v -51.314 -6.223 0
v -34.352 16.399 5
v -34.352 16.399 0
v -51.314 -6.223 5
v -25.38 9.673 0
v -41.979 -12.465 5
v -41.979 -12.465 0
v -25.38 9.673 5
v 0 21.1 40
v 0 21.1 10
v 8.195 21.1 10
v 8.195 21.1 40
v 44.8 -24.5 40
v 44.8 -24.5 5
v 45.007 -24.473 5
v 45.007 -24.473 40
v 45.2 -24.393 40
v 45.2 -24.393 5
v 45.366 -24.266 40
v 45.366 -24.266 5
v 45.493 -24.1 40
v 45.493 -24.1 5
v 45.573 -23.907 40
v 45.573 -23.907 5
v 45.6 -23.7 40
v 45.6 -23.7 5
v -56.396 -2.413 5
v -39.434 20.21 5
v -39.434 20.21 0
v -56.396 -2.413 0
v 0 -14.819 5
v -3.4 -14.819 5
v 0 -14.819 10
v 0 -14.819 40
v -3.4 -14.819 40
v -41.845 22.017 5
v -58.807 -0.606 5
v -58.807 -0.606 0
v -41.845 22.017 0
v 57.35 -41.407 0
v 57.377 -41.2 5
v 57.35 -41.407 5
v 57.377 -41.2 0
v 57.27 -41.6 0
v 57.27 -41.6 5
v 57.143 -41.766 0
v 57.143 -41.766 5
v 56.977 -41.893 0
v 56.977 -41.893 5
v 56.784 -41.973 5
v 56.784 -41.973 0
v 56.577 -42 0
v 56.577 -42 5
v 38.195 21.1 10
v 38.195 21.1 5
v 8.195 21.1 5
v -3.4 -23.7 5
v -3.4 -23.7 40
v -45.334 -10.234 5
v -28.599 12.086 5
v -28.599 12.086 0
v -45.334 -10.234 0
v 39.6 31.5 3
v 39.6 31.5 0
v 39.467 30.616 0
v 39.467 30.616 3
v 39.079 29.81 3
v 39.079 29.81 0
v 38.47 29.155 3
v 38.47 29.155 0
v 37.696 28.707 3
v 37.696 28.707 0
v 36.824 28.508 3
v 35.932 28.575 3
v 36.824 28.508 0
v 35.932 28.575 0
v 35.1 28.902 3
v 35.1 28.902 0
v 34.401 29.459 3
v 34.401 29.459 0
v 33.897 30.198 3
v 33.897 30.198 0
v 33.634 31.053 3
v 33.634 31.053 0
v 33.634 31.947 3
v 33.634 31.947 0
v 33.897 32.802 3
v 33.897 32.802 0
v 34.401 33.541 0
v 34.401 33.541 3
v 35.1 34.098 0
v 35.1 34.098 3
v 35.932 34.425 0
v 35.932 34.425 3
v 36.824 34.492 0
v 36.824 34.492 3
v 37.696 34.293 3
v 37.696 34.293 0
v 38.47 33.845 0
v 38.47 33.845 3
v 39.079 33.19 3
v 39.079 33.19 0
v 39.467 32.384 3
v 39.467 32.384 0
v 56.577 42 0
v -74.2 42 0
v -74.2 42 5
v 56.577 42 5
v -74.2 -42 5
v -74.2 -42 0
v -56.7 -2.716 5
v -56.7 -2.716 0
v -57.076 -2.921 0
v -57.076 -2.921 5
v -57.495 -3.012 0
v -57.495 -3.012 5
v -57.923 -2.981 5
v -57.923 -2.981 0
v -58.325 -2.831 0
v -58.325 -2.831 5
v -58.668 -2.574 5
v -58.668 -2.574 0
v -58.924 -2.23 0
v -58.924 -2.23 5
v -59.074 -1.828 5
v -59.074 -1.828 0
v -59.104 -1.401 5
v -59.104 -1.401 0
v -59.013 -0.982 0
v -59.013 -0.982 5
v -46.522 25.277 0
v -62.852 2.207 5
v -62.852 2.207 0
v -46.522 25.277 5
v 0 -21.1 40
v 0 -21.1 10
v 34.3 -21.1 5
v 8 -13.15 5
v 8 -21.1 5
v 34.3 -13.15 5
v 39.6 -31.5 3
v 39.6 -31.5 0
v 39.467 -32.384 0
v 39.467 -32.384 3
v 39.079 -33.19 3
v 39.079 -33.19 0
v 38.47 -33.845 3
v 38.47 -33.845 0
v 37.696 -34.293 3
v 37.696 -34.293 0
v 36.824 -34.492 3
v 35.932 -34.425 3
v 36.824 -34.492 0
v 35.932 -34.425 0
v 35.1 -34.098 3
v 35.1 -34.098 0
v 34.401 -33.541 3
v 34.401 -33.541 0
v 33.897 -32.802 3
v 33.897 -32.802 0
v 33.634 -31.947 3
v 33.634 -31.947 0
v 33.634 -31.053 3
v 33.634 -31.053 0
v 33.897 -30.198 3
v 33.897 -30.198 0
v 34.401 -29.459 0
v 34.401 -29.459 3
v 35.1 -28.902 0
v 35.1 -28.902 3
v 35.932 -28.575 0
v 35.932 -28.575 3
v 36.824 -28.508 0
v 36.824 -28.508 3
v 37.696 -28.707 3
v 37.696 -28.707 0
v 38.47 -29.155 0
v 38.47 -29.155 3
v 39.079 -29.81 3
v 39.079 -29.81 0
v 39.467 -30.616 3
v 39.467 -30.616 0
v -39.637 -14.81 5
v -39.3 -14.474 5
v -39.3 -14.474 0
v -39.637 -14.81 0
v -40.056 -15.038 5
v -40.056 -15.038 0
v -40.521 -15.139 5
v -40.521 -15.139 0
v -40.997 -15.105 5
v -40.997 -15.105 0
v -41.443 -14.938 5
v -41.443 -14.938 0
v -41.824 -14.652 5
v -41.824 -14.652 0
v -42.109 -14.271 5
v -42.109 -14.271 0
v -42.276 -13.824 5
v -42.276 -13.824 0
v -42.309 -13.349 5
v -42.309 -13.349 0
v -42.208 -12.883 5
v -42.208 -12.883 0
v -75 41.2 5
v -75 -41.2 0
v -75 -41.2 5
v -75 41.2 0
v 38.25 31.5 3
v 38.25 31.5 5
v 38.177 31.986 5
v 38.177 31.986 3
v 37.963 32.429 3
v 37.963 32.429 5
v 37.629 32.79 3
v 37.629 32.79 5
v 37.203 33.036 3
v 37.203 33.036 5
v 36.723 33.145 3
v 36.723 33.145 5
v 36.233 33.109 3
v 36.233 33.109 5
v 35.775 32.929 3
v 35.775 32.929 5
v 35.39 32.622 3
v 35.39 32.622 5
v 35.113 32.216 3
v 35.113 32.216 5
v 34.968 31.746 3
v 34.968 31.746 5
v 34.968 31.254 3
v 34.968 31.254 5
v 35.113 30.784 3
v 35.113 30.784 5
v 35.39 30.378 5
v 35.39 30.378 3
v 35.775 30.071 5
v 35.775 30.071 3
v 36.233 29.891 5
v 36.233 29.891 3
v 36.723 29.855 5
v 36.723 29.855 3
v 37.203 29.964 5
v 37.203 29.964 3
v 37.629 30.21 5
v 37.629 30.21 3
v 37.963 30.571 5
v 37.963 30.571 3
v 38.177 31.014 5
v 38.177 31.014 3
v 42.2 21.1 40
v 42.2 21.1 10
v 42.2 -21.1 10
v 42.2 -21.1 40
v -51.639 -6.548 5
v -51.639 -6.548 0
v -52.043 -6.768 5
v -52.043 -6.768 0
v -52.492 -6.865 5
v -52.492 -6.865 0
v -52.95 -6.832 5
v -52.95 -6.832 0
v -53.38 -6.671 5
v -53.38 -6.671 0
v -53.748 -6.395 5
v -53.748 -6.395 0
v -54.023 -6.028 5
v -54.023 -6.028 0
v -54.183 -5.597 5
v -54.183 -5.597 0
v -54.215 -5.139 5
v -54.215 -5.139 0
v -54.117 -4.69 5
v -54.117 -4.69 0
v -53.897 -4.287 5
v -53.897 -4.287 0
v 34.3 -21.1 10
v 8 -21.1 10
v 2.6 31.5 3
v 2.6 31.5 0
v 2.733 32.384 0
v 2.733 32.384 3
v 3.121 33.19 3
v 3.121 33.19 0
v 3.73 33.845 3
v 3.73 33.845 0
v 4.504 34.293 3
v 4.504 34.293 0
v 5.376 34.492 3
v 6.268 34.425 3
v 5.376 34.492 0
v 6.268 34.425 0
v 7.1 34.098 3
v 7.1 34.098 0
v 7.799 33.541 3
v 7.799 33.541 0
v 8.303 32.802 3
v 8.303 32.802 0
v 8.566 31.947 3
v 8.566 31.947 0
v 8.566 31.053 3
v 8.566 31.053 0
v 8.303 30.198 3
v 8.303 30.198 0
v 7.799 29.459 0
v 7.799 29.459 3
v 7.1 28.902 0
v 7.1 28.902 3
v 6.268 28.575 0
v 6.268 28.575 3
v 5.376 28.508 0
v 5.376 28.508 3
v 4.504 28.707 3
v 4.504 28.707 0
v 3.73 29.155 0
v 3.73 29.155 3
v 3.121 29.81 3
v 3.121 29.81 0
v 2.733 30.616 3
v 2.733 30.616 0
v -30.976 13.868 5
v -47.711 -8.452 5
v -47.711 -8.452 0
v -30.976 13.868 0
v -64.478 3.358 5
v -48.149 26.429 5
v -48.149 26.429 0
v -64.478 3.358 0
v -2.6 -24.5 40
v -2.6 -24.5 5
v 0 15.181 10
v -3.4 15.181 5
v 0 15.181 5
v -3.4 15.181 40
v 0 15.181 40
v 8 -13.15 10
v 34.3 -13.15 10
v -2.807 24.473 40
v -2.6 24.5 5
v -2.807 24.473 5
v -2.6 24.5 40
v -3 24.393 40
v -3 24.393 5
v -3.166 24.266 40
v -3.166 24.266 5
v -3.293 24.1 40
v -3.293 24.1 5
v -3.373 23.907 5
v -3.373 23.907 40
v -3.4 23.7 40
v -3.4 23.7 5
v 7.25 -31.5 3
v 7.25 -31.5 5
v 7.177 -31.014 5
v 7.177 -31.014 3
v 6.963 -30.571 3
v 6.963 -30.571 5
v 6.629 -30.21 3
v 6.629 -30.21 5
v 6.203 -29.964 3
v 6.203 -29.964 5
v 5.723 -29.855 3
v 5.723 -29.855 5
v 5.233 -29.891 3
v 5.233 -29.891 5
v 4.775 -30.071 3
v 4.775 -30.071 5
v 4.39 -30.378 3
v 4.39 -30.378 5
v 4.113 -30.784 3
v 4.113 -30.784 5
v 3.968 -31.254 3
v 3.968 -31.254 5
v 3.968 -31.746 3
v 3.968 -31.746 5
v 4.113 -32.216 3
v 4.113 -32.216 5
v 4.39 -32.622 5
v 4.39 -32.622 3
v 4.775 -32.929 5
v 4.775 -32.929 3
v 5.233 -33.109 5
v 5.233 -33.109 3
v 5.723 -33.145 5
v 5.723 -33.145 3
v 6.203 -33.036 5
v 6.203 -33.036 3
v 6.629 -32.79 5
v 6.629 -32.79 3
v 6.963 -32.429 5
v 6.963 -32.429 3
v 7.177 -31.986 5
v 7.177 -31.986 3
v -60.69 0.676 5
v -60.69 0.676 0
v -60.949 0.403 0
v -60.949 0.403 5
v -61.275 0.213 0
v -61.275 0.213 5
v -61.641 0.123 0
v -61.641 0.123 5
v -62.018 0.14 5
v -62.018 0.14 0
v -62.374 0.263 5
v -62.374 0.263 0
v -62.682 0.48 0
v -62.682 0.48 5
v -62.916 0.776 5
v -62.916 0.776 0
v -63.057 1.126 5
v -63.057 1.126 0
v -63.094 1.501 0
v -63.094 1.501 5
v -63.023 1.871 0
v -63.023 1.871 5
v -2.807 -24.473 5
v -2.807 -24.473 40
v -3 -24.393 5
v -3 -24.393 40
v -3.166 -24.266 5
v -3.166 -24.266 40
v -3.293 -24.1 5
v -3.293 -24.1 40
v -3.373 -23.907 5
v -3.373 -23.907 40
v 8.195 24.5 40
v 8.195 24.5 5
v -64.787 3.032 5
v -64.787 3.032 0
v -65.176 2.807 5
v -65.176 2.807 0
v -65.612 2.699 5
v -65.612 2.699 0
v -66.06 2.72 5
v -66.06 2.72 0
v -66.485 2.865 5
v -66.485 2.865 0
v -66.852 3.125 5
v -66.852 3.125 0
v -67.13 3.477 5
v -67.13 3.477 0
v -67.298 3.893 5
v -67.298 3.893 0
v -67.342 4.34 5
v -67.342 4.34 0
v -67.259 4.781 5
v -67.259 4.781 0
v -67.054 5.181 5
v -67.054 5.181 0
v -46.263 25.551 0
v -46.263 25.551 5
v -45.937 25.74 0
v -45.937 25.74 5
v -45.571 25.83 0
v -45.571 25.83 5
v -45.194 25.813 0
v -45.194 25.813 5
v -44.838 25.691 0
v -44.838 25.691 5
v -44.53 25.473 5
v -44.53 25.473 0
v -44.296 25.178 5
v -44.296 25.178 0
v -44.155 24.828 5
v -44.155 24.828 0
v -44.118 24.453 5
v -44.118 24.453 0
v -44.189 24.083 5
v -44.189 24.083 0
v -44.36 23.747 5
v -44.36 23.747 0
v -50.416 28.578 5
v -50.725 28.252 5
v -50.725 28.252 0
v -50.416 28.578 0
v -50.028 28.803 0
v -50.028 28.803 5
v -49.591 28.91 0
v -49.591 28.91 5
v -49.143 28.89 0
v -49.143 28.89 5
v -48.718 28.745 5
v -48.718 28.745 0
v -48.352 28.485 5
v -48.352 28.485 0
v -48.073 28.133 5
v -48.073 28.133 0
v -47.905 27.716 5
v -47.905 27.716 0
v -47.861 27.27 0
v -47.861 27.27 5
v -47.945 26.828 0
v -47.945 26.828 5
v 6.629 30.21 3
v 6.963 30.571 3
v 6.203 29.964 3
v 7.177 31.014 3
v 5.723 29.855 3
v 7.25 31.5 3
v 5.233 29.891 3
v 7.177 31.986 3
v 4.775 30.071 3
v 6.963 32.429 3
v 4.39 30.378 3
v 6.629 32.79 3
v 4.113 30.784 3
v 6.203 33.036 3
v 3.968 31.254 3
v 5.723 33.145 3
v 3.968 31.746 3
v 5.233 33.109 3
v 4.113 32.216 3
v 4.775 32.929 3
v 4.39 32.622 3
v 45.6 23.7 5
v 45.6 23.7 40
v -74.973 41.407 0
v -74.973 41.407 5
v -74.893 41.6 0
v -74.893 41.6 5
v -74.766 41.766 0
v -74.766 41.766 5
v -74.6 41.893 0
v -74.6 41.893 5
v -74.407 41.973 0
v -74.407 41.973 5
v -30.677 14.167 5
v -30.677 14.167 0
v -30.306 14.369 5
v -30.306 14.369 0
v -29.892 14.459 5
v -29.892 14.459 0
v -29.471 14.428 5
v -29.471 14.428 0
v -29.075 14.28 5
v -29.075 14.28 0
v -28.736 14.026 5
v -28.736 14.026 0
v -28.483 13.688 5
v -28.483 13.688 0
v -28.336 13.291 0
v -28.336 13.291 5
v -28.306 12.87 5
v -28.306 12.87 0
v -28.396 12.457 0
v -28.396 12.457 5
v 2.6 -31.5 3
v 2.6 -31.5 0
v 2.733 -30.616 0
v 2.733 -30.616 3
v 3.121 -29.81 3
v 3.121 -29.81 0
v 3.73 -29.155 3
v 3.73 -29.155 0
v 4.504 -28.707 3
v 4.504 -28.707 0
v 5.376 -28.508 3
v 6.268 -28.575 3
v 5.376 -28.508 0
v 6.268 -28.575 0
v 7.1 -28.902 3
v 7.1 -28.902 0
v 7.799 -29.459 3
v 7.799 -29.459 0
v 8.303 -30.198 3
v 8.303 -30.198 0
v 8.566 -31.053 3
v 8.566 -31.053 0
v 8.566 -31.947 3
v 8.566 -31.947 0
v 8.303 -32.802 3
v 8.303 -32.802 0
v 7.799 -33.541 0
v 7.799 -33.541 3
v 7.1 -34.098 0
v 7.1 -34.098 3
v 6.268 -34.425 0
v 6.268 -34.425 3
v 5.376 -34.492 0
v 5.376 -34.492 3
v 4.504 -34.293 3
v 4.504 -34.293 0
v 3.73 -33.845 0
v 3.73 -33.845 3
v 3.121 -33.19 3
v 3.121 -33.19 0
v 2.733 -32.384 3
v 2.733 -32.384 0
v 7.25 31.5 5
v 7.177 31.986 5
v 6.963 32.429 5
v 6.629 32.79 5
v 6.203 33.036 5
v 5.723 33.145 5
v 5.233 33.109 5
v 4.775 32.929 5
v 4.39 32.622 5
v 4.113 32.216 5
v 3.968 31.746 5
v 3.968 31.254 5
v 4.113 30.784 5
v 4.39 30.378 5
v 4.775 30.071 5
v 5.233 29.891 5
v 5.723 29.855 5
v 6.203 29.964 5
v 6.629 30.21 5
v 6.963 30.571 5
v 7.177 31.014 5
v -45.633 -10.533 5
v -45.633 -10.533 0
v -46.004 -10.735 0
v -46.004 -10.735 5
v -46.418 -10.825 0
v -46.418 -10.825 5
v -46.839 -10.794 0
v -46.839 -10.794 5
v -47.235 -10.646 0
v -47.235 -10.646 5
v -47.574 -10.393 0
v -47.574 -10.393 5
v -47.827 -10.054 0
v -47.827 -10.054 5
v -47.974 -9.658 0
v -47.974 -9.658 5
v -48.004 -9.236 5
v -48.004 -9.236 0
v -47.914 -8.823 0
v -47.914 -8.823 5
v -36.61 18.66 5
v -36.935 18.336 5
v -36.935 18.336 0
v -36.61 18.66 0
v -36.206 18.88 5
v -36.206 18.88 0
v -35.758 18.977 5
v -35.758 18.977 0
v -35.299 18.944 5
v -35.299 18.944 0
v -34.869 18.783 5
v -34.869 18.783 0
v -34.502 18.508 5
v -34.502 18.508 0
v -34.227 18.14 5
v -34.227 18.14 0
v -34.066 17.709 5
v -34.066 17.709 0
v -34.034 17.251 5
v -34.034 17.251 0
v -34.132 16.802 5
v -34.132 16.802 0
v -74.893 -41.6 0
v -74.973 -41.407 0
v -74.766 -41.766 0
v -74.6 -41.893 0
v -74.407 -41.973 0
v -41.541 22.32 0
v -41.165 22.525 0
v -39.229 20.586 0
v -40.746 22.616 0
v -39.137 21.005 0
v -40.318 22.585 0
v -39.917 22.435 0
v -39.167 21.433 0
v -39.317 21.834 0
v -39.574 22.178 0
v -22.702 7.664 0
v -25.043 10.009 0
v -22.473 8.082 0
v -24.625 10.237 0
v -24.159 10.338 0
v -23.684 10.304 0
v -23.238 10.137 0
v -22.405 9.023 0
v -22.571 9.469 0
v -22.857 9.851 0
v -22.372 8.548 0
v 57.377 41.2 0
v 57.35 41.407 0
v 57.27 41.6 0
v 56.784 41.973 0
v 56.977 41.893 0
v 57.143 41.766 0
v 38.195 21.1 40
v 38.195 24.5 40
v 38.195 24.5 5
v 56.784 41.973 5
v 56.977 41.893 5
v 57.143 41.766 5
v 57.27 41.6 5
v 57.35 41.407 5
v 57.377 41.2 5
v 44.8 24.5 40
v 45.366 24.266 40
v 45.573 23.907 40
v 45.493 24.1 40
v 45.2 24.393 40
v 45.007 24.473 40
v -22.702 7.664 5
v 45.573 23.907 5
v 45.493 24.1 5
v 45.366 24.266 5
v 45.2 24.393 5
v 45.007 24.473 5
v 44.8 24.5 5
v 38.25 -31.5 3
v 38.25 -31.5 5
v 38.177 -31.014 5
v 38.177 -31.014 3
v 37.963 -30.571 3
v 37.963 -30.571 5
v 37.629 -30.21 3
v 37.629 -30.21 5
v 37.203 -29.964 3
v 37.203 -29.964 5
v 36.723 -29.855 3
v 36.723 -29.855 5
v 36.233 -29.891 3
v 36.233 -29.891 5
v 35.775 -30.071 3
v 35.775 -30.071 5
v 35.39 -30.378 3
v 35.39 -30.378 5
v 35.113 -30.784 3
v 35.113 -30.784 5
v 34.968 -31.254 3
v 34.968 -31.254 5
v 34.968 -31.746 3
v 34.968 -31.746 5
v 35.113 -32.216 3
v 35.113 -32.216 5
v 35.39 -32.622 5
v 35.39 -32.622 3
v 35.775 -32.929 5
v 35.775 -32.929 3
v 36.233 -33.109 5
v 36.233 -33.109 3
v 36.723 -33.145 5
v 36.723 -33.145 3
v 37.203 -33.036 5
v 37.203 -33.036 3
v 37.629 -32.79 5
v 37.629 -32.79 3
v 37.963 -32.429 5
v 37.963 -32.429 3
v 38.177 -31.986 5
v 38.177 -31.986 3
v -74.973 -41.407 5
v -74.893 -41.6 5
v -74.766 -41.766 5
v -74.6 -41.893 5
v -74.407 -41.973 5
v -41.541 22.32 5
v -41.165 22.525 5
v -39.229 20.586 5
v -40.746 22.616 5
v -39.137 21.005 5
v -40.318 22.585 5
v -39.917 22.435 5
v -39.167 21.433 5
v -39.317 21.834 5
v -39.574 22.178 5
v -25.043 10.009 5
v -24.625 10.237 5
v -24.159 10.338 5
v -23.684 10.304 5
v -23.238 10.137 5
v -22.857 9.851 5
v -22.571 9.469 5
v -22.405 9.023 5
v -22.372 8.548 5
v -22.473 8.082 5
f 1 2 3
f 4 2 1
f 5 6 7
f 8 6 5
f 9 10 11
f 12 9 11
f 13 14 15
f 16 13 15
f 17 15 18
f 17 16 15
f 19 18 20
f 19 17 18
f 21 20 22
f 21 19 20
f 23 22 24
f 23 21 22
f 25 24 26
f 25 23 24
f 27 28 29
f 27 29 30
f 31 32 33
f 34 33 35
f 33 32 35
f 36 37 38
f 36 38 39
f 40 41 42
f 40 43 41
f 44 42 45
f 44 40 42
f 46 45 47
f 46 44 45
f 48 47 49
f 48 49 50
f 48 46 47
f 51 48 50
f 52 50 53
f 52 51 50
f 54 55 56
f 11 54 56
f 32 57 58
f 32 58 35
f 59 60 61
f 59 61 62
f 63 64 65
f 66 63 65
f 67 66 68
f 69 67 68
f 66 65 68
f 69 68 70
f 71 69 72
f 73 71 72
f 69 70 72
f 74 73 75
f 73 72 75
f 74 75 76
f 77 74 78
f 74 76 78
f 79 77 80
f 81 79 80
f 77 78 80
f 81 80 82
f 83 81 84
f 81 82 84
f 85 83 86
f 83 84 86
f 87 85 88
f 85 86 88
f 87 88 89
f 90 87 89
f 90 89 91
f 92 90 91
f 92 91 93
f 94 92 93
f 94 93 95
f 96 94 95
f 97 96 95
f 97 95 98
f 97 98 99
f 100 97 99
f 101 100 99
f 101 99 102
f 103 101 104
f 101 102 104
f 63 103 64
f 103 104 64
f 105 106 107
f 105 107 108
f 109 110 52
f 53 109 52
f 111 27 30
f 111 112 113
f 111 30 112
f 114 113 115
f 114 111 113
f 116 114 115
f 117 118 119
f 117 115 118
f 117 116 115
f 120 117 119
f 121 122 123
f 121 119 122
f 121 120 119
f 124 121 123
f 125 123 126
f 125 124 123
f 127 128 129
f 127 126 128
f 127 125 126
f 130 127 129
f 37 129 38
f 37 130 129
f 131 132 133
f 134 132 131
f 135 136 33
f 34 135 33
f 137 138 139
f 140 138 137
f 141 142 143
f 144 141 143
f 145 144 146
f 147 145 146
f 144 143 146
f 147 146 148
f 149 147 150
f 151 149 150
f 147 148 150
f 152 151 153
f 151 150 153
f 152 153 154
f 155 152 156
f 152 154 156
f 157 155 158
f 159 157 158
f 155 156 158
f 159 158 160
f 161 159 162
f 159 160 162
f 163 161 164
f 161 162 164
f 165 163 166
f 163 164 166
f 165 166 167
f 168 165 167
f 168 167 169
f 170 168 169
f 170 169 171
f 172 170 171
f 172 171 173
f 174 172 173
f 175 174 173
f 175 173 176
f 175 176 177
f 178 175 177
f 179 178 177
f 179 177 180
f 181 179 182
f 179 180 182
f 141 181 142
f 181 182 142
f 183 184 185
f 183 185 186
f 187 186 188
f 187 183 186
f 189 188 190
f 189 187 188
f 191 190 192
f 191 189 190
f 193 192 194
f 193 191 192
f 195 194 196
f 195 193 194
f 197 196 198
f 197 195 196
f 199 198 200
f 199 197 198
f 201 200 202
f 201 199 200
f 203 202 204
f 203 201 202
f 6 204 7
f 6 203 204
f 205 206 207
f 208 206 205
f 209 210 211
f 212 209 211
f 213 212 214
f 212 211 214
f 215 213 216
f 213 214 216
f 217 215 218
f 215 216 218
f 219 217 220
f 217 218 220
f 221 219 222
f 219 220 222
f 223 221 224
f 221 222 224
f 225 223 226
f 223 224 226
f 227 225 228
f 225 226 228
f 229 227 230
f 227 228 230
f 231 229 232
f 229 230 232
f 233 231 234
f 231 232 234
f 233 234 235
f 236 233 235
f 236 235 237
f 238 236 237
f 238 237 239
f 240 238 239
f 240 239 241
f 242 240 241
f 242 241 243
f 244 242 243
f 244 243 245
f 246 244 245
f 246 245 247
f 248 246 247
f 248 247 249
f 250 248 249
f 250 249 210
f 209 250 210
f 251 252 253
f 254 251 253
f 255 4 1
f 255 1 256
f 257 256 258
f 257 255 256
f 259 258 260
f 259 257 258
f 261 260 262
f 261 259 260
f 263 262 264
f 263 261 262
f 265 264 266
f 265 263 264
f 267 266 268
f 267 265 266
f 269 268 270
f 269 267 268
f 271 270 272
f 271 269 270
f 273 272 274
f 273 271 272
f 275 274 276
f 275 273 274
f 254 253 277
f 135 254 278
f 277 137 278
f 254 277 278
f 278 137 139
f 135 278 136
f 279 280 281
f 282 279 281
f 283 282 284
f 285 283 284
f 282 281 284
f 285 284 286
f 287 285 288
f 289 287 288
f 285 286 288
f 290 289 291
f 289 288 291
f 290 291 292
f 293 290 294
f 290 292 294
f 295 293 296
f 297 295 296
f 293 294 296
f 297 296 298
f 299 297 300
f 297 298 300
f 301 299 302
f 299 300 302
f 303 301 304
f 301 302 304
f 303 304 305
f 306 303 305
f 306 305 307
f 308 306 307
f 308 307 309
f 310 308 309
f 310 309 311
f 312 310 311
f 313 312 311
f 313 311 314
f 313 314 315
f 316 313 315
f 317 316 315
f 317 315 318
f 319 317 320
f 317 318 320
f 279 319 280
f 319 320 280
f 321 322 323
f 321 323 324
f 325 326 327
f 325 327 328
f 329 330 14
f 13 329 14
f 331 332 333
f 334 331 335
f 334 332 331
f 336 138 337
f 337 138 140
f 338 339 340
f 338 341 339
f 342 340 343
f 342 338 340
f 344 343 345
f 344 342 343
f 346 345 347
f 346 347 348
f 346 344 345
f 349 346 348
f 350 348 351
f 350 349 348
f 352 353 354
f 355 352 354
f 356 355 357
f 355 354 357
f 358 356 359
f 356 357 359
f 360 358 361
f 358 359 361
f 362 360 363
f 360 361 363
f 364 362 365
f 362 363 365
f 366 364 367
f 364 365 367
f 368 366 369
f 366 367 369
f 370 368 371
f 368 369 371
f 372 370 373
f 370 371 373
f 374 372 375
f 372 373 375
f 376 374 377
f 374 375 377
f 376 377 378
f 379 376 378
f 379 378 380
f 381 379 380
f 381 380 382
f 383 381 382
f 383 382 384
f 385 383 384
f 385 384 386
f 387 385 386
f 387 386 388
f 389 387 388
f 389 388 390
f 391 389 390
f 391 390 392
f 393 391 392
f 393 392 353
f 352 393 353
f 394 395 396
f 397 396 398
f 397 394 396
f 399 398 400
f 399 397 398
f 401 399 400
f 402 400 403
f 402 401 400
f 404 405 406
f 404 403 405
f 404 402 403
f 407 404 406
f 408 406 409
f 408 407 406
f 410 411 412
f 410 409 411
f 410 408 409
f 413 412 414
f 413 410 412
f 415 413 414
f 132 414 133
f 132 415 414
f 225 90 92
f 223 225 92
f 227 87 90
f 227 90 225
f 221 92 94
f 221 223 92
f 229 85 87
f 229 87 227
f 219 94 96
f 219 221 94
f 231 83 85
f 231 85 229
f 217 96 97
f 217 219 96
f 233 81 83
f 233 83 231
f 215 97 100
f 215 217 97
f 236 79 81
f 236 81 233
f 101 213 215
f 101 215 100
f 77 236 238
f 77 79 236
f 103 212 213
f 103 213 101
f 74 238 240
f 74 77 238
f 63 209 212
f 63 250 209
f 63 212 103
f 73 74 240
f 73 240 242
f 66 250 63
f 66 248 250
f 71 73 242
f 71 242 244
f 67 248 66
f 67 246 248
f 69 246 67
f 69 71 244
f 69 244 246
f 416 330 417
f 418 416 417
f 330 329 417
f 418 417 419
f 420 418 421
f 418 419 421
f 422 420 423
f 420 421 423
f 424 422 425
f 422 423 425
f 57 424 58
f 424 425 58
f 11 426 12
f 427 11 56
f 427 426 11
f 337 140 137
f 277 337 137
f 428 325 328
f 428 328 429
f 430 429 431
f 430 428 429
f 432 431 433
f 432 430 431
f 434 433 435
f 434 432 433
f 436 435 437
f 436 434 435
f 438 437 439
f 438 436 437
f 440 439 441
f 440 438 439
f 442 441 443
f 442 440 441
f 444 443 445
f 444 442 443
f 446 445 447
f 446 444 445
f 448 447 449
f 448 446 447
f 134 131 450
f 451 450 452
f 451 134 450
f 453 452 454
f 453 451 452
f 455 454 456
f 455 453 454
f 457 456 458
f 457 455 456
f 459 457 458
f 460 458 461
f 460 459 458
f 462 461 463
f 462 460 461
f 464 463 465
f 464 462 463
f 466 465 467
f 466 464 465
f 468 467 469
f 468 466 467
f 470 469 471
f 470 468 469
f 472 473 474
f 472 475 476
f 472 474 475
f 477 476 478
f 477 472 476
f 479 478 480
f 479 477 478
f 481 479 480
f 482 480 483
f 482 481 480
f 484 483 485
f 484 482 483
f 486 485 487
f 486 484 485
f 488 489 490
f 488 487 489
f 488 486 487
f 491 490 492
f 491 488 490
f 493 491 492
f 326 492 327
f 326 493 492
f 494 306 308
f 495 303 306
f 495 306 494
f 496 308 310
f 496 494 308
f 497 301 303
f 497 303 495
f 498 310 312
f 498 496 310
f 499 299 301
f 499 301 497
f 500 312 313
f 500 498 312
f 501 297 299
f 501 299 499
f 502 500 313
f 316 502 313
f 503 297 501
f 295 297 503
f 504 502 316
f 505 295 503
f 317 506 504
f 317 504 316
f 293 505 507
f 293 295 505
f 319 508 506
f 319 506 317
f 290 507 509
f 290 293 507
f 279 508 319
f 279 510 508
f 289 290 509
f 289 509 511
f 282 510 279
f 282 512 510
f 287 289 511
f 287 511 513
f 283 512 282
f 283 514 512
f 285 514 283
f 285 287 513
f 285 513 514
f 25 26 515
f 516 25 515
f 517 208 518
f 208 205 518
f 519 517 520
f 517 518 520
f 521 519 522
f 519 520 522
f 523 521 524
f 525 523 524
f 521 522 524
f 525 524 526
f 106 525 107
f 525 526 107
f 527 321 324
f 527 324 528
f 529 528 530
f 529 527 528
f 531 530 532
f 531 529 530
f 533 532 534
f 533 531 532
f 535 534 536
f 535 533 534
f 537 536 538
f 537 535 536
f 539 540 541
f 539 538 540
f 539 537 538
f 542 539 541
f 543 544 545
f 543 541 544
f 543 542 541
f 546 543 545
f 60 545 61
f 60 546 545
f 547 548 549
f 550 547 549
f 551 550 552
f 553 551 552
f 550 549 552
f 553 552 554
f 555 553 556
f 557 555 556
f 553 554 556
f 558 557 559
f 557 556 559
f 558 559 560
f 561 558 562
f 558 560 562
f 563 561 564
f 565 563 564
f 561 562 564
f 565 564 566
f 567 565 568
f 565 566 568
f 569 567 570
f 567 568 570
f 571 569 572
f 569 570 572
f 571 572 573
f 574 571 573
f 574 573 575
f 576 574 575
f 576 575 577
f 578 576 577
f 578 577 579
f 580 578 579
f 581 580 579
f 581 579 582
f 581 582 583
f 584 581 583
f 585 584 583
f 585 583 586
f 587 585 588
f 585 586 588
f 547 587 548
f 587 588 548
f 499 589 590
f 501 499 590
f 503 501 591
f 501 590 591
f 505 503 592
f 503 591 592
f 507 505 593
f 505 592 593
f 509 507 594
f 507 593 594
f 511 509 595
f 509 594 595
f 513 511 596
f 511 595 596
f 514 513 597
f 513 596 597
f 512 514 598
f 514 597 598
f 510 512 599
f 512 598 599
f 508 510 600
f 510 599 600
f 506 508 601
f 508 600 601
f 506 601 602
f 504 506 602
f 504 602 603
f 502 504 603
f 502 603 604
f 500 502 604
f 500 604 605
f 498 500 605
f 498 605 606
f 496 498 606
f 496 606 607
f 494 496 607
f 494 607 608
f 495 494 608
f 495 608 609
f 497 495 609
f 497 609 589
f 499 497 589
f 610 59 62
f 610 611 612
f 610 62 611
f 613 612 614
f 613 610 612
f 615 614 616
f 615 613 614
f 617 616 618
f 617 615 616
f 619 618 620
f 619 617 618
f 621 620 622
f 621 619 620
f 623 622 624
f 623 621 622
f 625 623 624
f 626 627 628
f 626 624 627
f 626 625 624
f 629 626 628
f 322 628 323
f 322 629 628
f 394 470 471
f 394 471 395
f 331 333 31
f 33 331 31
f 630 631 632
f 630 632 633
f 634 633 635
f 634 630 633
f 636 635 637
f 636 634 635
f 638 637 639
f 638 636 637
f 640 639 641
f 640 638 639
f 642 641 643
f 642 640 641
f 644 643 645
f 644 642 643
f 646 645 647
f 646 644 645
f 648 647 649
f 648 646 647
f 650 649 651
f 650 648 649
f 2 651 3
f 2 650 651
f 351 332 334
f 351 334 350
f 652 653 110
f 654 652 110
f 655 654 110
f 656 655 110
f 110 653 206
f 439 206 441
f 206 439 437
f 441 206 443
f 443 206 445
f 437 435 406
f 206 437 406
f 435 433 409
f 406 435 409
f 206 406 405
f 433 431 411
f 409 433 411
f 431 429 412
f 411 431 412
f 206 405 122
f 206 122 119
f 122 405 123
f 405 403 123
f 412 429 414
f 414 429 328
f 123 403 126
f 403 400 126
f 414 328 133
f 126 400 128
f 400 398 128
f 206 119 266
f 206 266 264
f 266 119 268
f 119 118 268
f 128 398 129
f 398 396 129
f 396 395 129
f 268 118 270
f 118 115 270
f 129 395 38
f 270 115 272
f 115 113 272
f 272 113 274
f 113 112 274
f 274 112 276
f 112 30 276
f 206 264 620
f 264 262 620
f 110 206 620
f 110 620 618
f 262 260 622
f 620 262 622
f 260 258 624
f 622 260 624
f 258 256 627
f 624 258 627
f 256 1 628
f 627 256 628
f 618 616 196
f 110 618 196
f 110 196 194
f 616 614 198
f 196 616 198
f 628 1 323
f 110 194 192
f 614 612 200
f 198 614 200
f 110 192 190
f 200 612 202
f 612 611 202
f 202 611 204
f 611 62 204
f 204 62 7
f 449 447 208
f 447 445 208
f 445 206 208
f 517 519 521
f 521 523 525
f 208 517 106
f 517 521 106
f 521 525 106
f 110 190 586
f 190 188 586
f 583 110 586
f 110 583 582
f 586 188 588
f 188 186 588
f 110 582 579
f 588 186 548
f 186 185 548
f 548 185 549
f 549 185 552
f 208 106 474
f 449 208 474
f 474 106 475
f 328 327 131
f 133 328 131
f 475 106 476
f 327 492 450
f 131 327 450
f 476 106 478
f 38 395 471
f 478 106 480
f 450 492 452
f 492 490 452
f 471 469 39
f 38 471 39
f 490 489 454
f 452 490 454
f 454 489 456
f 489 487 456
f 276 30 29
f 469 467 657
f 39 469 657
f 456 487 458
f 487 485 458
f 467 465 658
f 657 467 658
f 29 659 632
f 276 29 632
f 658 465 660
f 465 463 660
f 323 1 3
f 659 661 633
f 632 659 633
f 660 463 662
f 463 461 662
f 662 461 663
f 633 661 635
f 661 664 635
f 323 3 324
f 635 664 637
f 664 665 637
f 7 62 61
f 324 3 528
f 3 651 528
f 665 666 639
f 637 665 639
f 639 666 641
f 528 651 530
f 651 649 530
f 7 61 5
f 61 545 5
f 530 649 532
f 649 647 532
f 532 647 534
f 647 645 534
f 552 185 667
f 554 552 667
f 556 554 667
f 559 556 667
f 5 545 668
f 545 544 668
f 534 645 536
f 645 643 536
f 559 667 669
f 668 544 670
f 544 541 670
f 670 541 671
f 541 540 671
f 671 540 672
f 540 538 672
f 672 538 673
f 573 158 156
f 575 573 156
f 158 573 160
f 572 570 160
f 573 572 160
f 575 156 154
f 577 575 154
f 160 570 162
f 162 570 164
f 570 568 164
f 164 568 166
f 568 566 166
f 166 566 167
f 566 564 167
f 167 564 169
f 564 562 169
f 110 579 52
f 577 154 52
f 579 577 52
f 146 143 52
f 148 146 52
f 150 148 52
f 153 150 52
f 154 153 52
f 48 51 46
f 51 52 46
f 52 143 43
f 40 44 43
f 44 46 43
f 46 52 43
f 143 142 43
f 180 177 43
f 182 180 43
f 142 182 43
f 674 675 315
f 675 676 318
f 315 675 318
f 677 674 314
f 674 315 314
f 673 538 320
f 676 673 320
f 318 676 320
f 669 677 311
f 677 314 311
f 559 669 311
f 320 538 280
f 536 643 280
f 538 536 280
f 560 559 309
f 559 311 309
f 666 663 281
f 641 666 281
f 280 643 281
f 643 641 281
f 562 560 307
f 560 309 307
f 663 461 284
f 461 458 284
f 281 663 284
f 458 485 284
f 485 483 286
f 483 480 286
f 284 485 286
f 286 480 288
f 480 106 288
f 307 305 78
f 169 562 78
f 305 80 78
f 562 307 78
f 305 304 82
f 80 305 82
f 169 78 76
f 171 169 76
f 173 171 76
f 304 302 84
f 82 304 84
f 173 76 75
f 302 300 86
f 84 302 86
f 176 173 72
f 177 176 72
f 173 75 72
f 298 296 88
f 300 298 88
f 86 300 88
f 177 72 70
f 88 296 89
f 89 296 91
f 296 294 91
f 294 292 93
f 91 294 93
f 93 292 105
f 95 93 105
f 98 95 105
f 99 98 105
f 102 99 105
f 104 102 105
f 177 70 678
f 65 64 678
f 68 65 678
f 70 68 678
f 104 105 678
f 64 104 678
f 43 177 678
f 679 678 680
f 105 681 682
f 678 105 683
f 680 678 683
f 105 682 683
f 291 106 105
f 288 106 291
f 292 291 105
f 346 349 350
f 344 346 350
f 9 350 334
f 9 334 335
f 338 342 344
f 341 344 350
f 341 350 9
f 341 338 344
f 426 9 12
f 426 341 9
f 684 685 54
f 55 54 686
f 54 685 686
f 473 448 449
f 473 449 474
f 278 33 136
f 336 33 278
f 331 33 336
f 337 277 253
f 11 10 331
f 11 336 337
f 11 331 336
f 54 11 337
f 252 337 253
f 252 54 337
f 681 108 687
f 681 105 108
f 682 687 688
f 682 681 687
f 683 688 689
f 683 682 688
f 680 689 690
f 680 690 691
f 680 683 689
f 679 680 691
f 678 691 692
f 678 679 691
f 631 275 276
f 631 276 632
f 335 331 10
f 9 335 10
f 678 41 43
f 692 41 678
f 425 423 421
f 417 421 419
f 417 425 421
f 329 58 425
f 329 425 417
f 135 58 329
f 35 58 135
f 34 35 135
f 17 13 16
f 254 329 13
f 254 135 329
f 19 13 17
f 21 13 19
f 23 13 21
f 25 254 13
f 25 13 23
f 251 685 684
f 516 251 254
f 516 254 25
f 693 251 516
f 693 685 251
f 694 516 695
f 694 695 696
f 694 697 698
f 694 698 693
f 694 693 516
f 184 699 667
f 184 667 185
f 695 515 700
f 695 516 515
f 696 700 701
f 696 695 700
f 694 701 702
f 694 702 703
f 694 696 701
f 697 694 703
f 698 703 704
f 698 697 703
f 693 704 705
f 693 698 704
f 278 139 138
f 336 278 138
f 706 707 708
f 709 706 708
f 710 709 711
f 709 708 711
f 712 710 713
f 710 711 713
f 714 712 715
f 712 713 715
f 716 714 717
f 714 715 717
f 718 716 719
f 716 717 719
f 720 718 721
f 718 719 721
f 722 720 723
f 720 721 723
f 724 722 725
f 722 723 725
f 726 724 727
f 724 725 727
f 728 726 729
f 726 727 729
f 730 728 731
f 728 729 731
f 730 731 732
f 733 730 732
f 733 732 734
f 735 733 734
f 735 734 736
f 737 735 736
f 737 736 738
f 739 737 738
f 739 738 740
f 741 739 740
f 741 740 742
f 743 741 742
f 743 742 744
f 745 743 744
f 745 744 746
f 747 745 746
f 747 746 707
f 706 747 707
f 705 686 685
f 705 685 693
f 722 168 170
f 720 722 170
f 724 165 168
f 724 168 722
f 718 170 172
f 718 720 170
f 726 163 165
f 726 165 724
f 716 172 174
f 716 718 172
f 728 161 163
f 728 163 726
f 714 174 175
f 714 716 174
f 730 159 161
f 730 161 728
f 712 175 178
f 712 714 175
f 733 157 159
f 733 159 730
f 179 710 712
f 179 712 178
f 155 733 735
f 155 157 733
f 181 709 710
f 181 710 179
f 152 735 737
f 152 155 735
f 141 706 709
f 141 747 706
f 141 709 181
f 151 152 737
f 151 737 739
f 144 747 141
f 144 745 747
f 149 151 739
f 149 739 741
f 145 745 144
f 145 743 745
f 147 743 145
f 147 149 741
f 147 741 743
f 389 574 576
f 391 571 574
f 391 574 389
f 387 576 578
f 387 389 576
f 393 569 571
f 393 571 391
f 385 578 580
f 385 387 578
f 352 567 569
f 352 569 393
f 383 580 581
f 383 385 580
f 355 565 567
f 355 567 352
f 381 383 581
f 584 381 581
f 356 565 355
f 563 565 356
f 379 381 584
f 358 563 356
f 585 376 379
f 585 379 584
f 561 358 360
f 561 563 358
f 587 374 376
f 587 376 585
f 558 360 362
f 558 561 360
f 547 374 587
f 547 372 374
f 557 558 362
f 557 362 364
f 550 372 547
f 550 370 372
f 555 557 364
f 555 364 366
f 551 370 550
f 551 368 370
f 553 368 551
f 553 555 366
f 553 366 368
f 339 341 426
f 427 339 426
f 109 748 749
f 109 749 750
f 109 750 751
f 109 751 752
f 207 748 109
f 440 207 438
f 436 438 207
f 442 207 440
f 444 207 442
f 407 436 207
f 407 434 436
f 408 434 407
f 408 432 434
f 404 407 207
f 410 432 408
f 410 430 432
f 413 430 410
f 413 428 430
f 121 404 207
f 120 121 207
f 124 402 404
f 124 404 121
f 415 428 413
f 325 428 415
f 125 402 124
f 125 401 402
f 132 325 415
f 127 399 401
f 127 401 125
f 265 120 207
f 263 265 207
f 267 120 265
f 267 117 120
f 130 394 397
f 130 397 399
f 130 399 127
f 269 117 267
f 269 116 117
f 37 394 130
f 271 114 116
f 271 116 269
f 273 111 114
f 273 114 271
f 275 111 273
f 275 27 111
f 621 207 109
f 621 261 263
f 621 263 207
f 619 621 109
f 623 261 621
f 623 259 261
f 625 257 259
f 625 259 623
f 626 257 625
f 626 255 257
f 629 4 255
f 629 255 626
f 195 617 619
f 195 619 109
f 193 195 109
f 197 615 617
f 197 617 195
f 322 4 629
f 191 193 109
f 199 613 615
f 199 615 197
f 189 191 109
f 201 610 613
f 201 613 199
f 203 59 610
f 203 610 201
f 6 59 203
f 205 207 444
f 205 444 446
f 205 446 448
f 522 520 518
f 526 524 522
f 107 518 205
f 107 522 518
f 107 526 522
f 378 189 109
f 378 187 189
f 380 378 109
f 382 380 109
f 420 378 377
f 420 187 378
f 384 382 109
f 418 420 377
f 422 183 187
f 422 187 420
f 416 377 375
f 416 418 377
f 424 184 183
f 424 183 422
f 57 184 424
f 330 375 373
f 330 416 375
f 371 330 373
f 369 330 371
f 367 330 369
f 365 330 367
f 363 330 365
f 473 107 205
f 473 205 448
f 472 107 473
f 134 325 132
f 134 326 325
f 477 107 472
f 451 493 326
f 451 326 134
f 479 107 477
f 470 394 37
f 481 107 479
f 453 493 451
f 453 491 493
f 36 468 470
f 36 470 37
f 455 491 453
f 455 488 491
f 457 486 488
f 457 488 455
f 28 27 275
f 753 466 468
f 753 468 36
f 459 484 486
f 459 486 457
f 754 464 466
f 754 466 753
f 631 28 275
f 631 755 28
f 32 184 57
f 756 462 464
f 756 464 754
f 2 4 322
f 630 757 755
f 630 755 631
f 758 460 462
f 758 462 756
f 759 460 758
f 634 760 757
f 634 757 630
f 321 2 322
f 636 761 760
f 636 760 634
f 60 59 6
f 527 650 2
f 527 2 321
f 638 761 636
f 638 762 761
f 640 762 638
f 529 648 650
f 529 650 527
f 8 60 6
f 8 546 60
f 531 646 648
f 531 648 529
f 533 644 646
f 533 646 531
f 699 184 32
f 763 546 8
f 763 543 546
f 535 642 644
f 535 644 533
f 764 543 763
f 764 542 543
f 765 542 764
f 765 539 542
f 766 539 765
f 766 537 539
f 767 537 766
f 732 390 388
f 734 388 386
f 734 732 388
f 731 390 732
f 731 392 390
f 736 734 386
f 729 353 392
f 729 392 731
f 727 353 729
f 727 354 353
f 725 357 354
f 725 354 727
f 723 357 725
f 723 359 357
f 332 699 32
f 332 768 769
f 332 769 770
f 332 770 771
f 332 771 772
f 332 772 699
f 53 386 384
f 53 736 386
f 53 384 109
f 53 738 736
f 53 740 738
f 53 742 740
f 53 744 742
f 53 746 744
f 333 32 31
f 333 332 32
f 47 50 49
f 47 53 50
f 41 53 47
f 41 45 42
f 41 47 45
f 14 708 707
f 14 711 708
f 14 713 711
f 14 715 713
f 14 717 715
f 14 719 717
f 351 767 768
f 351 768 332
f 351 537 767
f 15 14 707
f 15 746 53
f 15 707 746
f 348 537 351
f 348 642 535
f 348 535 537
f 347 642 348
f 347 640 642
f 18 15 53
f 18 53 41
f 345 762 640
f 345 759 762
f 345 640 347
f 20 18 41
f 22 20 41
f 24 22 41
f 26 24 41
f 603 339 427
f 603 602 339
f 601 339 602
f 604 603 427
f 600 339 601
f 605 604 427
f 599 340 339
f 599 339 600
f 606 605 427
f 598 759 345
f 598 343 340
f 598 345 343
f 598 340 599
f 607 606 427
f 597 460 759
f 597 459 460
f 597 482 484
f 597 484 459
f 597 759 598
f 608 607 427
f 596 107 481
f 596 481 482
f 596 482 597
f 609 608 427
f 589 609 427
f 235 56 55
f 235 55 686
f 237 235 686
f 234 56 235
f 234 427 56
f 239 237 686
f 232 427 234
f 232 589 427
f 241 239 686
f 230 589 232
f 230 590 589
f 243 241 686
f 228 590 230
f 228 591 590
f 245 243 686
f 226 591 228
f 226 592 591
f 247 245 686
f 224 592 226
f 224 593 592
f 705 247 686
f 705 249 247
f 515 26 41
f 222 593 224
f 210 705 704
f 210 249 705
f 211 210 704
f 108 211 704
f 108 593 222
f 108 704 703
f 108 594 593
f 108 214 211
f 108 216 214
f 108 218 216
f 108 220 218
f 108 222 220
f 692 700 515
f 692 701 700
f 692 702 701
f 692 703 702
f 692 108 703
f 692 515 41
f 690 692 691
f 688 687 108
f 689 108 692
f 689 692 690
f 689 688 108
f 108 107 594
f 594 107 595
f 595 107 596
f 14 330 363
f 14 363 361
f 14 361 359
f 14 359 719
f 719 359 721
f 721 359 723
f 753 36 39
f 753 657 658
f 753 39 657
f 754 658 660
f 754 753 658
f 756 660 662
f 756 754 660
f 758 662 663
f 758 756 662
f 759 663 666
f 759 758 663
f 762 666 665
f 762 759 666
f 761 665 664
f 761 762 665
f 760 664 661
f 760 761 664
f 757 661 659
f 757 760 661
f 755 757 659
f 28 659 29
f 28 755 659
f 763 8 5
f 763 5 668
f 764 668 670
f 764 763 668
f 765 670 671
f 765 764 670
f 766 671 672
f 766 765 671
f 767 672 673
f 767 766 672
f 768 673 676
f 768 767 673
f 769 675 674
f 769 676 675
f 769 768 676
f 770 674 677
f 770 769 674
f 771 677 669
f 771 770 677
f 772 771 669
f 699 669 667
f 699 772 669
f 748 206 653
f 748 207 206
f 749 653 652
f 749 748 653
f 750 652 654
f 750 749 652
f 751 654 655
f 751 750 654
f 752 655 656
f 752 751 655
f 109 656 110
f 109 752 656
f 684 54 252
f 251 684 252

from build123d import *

# Parameters (mm, degrees)
SKETCH_1_W          = 150
SKETCH_1_H          = 84
EXTRUDE_1_DEPTH     = 5
SKETCH_2_W          = 49
SKETCH_2_H          = 49
EXTRUDE_2_DEPTH     = 35
SKETCH_3_W          = 35
SKETCH_3_H          = 30
CUT_EXTRUDE_1_DEPTH = 21
SKETCH_4_W          = 30
SKETCH_4_H          = 35
CUT_EXTRUDE_2_DEPTH = 21
FILLET_1_R          = 0.8
CUT_EXTRUDE_3_DEPTH = 21
SKETCH_6_W          = 27.415053397
SKETCH_6_H          = 84
CUT_EXTRUDE_4_DEPTH = 21
FILLET_2_R          = 0.8
EXTRUDE_5_DEPTH     = 5
SKETCH_12_R         = 1.65
CUT_EXTRUDE_5_DEPTH = 10
SKETCH_13_R         = 3
CUT_EXTRUDE_6_DEPTH = 3


with BuildPart() as part:
    # 草图1 → 凸台-拉伸1 (new body)
    with BuildSketch(Plane.XY):
        Rectangle(SKETCH_1_W, SKETCH_1_H)
    extrude(amount=EXTRUDE_1_DEPTH)

    # 草图2 → 凸台-拉伸2 (add)
    with BuildSketch(Plane.XY.offset(5)):
        with Locations((21.1, 0)):
            Rectangle(SKETCH_2_W, SKETCH_2_H)
        Polygon((0, 0), (0, 21.1), (42.2, 21.1), (42.2, -21.1), (0, -21.1), align=None, mode=Mode.SUBTRACT)
    extrude(amount=EXTRUDE_2_DEPTH)

    # 草图3 → 切除-拉伸1 (cut)
    with BuildSketch(Plane.ZY.offset(3.4)):
        with Locations((22.5, 0.18053777)):
            Rectangle(SKETCH_3_W, SKETCH_3_H)
    extrude(amount=-CUT_EXTRUDE_1_DEPTH, mode=Mode.SUBTRACT)

    # 草图4 → 切除-拉伸2 (cut)
    with BuildSketch(Plane(origin=(0, 24.5, 0), x_dir=(1, 0, 0), z_dir=(0, 1, 0))):
        with Locations((23.194652979, -22.5)):
            Rectangle(SKETCH_4_W, SKETCH_4_H)
    extrude(amount=-CUT_EXTRUDE_2_DEPTH, mode=Mode.SUBTRACT)

    # 圆角1
    fillet_1_edges = [part.edges().sort_by_distance(p)[0] for p in [
        (45.6, -24.5, 22.5),
        (45.6, 24.5, 22.5),
        (-3.4, 24.5, 22.5),
        (-3.4, -24.5, 22.5),
        (75, -42, 2.5),
        (-75, -42, 2.5),
        (-75, 42, 2.5),
        (75, 42, 2.5),
    ]]
    fillet(fillet_1_edges, radius=FILLET_1_R)

    # 草图5 → 切除-拉伸3 (cut)
    with BuildSketch(Plane.XY.offset(5)):
        with BuildLine():
            Line((-48.149197029, 26.428665041), (-64.478381839, 3.358073657))
            ThreePointArc((-64.478381839, 3.358073657), (-66.677650185, 2.98177299), (-67.053950852, 5.181041335))
            Line((-67.053950852, 5.181041335), (-50.724766042, 28.251632719))
            ThreePointArc((-50.724766042, 28.251632719), (-48.525497697, 28.627933386), (-48.149197029, 26.428665041))
        make_face()
        with BuildLine():
            Line((-44.360375577, 23.74696674), (-60.689560387, 0.676375357))
            ThreePointArc((-60.689560387, 0.676375357), (-62.535750423, 0.360487328), (-62.851638452, 2.206677363))
            Line((-62.851638452, 2.206677363), (-46.522453641, 25.277268747))
            ThreePointArc((-46.522453641, 25.277268747), (-44.676263606, 25.593156775), (-44.360375577, 23.74696674))
        make_face()
        with BuildLine():
            Line((-39.434375371, 20.209781933), (-56.396344169, -2.412929875))
            ThreePointArc((-56.396344169, -2.412929875), (-58.505226428, -2.71450716), (-58.806803713, -0.605624901))
            Line((-58.806803713, -0.605624901), (-41.844834915, 22.017086907))
            ThreePointArc((-41.844834915, 22.017086907), (-39.735952656, 22.318664192), (-39.434375371, 20.209781933))
        make_face()
        with BuildLine():
            Line((-34.352361813, 16.39940959), (-51.314330611, -6.223302218))
            ThreePointArc((-51.314330611, -6.223302218), (-53.573704294, -6.546400285), (-53.896802361, -4.287026602))
            Line((-53.896802361, -4.287026602), (-36.934833563, 18.335685206))
            ThreePointArc((-36.934833563, 18.335685206), (-34.67545988, 18.658783273), (-34.352361813, 16.39940959))
        make_face()
        with BuildLine():
            Line((-28.599059516, 12.085720989), (-45.333964099, -10.234148128))
            ThreePointArc((-45.333964099, -10.234148128), (-47.413554704, -10.531536607), (-47.710943184, -8.451946002))
            Line((-47.710943184, -8.451946002), (-30.976038601, 13.867923114))
            ThreePointArc((-30.976038601, 13.867923114), (-28.896447996, 14.165311594), (-28.599059516, 12.085720989))
        make_face()
        with BuildLine():
            Line((-22.701866689, 7.664146707), (-39.300291247, -14.473694703))
            ThreePointArc((-39.300291247, -14.473694703), (-41.643790703, -14.80882304), (-41.97891904, -12.465323584))
            Line((-41.97891904, -12.465323584), (-25.380494482, 9.672517826))
            ThreePointArc((-25.380494482, 9.672517826), (-23.036995026, 10.007646163), (-22.701866689, 7.664146707))
        make_face()
    extrude(amount=-CUT_EXTRUDE_3_DEPTH, mode=Mode.SUBTRACT)

    # 草图6 → 切除-拉伸4 (cut)
    with BuildSketch(Plane.XY.offset(5)):
        with Locations((71.084387087, 0)):
            Rectangle(SKETCH_6_W, SKETCH_6_H)
    extrude(amount=-CUT_EXTRUDE_4_DEPTH, mode=Mode.SUBTRACT)

    # 圆角2
    fillet_2_edges = [part.edges().sort_by_distance(p)[0] for p in [
        (57.376860388, -42, 2.5),
        (57.376860388, 42, 2.5),
    ]]
    fillet(fillet_2_edges, radius=FILLET_2_R)

    # 草图10 → 凸台-拉伸5 (add)
    with BuildSketch(Plane.XY.offset(5)):
        Polygon((0, 21.1), (0, -21.1), (8, -21.1), (8, -13.15), (34.3, -13.15), (34.3, -21.1), (42.2, -21.1), (42.2, 21.1), align=None)
    extrude(amount=EXTRUDE_5_DEPTH)

    # 草图12 → 切除-拉伸5 (cut)
    with BuildSketch(Plane.XY.offset(5)):
        with Locations((5.6, -31.5)):
            Circle(SKETCH_12_R)
        with Locations((5.6, 31.5)):
            Circle(SKETCH_12_R)
        with Locations((36.6, -31.5)):
            Circle(SKETCH_12_R)
        with Locations((36.6, 31.5)):
            Circle(SKETCH_12_R)
    extrude(amount=-CUT_EXTRUDE_5_DEPTH, mode=Mode.SUBTRACT)

    # 草图13 → 切除-拉伸6 (cut)
    with BuildSketch(Plane(origin=(0, 0, 0), x_dir=(-1, 0, 0), z_dir=(0, 0, -1))):
        with Locations((-5.6, 31.5)):
            Circle(SKETCH_13_R)
        with Locations((-5.6, -31.5)):
            Circle(SKETCH_13_R)
        with Locations(Location((-36.6, -31.5, 0), (0, 0, 180))):
            Circle(SKETCH_13_R)
        with Locations(Location((-36.6, 31.5, 0), (0, 0, 180))):
            Circle(SKETCH_13_R)
    extrude(amount=-CUT_EXTRUDE_6_DEPTH, mode=Mode.SUBTRACT)


solid = part.part
